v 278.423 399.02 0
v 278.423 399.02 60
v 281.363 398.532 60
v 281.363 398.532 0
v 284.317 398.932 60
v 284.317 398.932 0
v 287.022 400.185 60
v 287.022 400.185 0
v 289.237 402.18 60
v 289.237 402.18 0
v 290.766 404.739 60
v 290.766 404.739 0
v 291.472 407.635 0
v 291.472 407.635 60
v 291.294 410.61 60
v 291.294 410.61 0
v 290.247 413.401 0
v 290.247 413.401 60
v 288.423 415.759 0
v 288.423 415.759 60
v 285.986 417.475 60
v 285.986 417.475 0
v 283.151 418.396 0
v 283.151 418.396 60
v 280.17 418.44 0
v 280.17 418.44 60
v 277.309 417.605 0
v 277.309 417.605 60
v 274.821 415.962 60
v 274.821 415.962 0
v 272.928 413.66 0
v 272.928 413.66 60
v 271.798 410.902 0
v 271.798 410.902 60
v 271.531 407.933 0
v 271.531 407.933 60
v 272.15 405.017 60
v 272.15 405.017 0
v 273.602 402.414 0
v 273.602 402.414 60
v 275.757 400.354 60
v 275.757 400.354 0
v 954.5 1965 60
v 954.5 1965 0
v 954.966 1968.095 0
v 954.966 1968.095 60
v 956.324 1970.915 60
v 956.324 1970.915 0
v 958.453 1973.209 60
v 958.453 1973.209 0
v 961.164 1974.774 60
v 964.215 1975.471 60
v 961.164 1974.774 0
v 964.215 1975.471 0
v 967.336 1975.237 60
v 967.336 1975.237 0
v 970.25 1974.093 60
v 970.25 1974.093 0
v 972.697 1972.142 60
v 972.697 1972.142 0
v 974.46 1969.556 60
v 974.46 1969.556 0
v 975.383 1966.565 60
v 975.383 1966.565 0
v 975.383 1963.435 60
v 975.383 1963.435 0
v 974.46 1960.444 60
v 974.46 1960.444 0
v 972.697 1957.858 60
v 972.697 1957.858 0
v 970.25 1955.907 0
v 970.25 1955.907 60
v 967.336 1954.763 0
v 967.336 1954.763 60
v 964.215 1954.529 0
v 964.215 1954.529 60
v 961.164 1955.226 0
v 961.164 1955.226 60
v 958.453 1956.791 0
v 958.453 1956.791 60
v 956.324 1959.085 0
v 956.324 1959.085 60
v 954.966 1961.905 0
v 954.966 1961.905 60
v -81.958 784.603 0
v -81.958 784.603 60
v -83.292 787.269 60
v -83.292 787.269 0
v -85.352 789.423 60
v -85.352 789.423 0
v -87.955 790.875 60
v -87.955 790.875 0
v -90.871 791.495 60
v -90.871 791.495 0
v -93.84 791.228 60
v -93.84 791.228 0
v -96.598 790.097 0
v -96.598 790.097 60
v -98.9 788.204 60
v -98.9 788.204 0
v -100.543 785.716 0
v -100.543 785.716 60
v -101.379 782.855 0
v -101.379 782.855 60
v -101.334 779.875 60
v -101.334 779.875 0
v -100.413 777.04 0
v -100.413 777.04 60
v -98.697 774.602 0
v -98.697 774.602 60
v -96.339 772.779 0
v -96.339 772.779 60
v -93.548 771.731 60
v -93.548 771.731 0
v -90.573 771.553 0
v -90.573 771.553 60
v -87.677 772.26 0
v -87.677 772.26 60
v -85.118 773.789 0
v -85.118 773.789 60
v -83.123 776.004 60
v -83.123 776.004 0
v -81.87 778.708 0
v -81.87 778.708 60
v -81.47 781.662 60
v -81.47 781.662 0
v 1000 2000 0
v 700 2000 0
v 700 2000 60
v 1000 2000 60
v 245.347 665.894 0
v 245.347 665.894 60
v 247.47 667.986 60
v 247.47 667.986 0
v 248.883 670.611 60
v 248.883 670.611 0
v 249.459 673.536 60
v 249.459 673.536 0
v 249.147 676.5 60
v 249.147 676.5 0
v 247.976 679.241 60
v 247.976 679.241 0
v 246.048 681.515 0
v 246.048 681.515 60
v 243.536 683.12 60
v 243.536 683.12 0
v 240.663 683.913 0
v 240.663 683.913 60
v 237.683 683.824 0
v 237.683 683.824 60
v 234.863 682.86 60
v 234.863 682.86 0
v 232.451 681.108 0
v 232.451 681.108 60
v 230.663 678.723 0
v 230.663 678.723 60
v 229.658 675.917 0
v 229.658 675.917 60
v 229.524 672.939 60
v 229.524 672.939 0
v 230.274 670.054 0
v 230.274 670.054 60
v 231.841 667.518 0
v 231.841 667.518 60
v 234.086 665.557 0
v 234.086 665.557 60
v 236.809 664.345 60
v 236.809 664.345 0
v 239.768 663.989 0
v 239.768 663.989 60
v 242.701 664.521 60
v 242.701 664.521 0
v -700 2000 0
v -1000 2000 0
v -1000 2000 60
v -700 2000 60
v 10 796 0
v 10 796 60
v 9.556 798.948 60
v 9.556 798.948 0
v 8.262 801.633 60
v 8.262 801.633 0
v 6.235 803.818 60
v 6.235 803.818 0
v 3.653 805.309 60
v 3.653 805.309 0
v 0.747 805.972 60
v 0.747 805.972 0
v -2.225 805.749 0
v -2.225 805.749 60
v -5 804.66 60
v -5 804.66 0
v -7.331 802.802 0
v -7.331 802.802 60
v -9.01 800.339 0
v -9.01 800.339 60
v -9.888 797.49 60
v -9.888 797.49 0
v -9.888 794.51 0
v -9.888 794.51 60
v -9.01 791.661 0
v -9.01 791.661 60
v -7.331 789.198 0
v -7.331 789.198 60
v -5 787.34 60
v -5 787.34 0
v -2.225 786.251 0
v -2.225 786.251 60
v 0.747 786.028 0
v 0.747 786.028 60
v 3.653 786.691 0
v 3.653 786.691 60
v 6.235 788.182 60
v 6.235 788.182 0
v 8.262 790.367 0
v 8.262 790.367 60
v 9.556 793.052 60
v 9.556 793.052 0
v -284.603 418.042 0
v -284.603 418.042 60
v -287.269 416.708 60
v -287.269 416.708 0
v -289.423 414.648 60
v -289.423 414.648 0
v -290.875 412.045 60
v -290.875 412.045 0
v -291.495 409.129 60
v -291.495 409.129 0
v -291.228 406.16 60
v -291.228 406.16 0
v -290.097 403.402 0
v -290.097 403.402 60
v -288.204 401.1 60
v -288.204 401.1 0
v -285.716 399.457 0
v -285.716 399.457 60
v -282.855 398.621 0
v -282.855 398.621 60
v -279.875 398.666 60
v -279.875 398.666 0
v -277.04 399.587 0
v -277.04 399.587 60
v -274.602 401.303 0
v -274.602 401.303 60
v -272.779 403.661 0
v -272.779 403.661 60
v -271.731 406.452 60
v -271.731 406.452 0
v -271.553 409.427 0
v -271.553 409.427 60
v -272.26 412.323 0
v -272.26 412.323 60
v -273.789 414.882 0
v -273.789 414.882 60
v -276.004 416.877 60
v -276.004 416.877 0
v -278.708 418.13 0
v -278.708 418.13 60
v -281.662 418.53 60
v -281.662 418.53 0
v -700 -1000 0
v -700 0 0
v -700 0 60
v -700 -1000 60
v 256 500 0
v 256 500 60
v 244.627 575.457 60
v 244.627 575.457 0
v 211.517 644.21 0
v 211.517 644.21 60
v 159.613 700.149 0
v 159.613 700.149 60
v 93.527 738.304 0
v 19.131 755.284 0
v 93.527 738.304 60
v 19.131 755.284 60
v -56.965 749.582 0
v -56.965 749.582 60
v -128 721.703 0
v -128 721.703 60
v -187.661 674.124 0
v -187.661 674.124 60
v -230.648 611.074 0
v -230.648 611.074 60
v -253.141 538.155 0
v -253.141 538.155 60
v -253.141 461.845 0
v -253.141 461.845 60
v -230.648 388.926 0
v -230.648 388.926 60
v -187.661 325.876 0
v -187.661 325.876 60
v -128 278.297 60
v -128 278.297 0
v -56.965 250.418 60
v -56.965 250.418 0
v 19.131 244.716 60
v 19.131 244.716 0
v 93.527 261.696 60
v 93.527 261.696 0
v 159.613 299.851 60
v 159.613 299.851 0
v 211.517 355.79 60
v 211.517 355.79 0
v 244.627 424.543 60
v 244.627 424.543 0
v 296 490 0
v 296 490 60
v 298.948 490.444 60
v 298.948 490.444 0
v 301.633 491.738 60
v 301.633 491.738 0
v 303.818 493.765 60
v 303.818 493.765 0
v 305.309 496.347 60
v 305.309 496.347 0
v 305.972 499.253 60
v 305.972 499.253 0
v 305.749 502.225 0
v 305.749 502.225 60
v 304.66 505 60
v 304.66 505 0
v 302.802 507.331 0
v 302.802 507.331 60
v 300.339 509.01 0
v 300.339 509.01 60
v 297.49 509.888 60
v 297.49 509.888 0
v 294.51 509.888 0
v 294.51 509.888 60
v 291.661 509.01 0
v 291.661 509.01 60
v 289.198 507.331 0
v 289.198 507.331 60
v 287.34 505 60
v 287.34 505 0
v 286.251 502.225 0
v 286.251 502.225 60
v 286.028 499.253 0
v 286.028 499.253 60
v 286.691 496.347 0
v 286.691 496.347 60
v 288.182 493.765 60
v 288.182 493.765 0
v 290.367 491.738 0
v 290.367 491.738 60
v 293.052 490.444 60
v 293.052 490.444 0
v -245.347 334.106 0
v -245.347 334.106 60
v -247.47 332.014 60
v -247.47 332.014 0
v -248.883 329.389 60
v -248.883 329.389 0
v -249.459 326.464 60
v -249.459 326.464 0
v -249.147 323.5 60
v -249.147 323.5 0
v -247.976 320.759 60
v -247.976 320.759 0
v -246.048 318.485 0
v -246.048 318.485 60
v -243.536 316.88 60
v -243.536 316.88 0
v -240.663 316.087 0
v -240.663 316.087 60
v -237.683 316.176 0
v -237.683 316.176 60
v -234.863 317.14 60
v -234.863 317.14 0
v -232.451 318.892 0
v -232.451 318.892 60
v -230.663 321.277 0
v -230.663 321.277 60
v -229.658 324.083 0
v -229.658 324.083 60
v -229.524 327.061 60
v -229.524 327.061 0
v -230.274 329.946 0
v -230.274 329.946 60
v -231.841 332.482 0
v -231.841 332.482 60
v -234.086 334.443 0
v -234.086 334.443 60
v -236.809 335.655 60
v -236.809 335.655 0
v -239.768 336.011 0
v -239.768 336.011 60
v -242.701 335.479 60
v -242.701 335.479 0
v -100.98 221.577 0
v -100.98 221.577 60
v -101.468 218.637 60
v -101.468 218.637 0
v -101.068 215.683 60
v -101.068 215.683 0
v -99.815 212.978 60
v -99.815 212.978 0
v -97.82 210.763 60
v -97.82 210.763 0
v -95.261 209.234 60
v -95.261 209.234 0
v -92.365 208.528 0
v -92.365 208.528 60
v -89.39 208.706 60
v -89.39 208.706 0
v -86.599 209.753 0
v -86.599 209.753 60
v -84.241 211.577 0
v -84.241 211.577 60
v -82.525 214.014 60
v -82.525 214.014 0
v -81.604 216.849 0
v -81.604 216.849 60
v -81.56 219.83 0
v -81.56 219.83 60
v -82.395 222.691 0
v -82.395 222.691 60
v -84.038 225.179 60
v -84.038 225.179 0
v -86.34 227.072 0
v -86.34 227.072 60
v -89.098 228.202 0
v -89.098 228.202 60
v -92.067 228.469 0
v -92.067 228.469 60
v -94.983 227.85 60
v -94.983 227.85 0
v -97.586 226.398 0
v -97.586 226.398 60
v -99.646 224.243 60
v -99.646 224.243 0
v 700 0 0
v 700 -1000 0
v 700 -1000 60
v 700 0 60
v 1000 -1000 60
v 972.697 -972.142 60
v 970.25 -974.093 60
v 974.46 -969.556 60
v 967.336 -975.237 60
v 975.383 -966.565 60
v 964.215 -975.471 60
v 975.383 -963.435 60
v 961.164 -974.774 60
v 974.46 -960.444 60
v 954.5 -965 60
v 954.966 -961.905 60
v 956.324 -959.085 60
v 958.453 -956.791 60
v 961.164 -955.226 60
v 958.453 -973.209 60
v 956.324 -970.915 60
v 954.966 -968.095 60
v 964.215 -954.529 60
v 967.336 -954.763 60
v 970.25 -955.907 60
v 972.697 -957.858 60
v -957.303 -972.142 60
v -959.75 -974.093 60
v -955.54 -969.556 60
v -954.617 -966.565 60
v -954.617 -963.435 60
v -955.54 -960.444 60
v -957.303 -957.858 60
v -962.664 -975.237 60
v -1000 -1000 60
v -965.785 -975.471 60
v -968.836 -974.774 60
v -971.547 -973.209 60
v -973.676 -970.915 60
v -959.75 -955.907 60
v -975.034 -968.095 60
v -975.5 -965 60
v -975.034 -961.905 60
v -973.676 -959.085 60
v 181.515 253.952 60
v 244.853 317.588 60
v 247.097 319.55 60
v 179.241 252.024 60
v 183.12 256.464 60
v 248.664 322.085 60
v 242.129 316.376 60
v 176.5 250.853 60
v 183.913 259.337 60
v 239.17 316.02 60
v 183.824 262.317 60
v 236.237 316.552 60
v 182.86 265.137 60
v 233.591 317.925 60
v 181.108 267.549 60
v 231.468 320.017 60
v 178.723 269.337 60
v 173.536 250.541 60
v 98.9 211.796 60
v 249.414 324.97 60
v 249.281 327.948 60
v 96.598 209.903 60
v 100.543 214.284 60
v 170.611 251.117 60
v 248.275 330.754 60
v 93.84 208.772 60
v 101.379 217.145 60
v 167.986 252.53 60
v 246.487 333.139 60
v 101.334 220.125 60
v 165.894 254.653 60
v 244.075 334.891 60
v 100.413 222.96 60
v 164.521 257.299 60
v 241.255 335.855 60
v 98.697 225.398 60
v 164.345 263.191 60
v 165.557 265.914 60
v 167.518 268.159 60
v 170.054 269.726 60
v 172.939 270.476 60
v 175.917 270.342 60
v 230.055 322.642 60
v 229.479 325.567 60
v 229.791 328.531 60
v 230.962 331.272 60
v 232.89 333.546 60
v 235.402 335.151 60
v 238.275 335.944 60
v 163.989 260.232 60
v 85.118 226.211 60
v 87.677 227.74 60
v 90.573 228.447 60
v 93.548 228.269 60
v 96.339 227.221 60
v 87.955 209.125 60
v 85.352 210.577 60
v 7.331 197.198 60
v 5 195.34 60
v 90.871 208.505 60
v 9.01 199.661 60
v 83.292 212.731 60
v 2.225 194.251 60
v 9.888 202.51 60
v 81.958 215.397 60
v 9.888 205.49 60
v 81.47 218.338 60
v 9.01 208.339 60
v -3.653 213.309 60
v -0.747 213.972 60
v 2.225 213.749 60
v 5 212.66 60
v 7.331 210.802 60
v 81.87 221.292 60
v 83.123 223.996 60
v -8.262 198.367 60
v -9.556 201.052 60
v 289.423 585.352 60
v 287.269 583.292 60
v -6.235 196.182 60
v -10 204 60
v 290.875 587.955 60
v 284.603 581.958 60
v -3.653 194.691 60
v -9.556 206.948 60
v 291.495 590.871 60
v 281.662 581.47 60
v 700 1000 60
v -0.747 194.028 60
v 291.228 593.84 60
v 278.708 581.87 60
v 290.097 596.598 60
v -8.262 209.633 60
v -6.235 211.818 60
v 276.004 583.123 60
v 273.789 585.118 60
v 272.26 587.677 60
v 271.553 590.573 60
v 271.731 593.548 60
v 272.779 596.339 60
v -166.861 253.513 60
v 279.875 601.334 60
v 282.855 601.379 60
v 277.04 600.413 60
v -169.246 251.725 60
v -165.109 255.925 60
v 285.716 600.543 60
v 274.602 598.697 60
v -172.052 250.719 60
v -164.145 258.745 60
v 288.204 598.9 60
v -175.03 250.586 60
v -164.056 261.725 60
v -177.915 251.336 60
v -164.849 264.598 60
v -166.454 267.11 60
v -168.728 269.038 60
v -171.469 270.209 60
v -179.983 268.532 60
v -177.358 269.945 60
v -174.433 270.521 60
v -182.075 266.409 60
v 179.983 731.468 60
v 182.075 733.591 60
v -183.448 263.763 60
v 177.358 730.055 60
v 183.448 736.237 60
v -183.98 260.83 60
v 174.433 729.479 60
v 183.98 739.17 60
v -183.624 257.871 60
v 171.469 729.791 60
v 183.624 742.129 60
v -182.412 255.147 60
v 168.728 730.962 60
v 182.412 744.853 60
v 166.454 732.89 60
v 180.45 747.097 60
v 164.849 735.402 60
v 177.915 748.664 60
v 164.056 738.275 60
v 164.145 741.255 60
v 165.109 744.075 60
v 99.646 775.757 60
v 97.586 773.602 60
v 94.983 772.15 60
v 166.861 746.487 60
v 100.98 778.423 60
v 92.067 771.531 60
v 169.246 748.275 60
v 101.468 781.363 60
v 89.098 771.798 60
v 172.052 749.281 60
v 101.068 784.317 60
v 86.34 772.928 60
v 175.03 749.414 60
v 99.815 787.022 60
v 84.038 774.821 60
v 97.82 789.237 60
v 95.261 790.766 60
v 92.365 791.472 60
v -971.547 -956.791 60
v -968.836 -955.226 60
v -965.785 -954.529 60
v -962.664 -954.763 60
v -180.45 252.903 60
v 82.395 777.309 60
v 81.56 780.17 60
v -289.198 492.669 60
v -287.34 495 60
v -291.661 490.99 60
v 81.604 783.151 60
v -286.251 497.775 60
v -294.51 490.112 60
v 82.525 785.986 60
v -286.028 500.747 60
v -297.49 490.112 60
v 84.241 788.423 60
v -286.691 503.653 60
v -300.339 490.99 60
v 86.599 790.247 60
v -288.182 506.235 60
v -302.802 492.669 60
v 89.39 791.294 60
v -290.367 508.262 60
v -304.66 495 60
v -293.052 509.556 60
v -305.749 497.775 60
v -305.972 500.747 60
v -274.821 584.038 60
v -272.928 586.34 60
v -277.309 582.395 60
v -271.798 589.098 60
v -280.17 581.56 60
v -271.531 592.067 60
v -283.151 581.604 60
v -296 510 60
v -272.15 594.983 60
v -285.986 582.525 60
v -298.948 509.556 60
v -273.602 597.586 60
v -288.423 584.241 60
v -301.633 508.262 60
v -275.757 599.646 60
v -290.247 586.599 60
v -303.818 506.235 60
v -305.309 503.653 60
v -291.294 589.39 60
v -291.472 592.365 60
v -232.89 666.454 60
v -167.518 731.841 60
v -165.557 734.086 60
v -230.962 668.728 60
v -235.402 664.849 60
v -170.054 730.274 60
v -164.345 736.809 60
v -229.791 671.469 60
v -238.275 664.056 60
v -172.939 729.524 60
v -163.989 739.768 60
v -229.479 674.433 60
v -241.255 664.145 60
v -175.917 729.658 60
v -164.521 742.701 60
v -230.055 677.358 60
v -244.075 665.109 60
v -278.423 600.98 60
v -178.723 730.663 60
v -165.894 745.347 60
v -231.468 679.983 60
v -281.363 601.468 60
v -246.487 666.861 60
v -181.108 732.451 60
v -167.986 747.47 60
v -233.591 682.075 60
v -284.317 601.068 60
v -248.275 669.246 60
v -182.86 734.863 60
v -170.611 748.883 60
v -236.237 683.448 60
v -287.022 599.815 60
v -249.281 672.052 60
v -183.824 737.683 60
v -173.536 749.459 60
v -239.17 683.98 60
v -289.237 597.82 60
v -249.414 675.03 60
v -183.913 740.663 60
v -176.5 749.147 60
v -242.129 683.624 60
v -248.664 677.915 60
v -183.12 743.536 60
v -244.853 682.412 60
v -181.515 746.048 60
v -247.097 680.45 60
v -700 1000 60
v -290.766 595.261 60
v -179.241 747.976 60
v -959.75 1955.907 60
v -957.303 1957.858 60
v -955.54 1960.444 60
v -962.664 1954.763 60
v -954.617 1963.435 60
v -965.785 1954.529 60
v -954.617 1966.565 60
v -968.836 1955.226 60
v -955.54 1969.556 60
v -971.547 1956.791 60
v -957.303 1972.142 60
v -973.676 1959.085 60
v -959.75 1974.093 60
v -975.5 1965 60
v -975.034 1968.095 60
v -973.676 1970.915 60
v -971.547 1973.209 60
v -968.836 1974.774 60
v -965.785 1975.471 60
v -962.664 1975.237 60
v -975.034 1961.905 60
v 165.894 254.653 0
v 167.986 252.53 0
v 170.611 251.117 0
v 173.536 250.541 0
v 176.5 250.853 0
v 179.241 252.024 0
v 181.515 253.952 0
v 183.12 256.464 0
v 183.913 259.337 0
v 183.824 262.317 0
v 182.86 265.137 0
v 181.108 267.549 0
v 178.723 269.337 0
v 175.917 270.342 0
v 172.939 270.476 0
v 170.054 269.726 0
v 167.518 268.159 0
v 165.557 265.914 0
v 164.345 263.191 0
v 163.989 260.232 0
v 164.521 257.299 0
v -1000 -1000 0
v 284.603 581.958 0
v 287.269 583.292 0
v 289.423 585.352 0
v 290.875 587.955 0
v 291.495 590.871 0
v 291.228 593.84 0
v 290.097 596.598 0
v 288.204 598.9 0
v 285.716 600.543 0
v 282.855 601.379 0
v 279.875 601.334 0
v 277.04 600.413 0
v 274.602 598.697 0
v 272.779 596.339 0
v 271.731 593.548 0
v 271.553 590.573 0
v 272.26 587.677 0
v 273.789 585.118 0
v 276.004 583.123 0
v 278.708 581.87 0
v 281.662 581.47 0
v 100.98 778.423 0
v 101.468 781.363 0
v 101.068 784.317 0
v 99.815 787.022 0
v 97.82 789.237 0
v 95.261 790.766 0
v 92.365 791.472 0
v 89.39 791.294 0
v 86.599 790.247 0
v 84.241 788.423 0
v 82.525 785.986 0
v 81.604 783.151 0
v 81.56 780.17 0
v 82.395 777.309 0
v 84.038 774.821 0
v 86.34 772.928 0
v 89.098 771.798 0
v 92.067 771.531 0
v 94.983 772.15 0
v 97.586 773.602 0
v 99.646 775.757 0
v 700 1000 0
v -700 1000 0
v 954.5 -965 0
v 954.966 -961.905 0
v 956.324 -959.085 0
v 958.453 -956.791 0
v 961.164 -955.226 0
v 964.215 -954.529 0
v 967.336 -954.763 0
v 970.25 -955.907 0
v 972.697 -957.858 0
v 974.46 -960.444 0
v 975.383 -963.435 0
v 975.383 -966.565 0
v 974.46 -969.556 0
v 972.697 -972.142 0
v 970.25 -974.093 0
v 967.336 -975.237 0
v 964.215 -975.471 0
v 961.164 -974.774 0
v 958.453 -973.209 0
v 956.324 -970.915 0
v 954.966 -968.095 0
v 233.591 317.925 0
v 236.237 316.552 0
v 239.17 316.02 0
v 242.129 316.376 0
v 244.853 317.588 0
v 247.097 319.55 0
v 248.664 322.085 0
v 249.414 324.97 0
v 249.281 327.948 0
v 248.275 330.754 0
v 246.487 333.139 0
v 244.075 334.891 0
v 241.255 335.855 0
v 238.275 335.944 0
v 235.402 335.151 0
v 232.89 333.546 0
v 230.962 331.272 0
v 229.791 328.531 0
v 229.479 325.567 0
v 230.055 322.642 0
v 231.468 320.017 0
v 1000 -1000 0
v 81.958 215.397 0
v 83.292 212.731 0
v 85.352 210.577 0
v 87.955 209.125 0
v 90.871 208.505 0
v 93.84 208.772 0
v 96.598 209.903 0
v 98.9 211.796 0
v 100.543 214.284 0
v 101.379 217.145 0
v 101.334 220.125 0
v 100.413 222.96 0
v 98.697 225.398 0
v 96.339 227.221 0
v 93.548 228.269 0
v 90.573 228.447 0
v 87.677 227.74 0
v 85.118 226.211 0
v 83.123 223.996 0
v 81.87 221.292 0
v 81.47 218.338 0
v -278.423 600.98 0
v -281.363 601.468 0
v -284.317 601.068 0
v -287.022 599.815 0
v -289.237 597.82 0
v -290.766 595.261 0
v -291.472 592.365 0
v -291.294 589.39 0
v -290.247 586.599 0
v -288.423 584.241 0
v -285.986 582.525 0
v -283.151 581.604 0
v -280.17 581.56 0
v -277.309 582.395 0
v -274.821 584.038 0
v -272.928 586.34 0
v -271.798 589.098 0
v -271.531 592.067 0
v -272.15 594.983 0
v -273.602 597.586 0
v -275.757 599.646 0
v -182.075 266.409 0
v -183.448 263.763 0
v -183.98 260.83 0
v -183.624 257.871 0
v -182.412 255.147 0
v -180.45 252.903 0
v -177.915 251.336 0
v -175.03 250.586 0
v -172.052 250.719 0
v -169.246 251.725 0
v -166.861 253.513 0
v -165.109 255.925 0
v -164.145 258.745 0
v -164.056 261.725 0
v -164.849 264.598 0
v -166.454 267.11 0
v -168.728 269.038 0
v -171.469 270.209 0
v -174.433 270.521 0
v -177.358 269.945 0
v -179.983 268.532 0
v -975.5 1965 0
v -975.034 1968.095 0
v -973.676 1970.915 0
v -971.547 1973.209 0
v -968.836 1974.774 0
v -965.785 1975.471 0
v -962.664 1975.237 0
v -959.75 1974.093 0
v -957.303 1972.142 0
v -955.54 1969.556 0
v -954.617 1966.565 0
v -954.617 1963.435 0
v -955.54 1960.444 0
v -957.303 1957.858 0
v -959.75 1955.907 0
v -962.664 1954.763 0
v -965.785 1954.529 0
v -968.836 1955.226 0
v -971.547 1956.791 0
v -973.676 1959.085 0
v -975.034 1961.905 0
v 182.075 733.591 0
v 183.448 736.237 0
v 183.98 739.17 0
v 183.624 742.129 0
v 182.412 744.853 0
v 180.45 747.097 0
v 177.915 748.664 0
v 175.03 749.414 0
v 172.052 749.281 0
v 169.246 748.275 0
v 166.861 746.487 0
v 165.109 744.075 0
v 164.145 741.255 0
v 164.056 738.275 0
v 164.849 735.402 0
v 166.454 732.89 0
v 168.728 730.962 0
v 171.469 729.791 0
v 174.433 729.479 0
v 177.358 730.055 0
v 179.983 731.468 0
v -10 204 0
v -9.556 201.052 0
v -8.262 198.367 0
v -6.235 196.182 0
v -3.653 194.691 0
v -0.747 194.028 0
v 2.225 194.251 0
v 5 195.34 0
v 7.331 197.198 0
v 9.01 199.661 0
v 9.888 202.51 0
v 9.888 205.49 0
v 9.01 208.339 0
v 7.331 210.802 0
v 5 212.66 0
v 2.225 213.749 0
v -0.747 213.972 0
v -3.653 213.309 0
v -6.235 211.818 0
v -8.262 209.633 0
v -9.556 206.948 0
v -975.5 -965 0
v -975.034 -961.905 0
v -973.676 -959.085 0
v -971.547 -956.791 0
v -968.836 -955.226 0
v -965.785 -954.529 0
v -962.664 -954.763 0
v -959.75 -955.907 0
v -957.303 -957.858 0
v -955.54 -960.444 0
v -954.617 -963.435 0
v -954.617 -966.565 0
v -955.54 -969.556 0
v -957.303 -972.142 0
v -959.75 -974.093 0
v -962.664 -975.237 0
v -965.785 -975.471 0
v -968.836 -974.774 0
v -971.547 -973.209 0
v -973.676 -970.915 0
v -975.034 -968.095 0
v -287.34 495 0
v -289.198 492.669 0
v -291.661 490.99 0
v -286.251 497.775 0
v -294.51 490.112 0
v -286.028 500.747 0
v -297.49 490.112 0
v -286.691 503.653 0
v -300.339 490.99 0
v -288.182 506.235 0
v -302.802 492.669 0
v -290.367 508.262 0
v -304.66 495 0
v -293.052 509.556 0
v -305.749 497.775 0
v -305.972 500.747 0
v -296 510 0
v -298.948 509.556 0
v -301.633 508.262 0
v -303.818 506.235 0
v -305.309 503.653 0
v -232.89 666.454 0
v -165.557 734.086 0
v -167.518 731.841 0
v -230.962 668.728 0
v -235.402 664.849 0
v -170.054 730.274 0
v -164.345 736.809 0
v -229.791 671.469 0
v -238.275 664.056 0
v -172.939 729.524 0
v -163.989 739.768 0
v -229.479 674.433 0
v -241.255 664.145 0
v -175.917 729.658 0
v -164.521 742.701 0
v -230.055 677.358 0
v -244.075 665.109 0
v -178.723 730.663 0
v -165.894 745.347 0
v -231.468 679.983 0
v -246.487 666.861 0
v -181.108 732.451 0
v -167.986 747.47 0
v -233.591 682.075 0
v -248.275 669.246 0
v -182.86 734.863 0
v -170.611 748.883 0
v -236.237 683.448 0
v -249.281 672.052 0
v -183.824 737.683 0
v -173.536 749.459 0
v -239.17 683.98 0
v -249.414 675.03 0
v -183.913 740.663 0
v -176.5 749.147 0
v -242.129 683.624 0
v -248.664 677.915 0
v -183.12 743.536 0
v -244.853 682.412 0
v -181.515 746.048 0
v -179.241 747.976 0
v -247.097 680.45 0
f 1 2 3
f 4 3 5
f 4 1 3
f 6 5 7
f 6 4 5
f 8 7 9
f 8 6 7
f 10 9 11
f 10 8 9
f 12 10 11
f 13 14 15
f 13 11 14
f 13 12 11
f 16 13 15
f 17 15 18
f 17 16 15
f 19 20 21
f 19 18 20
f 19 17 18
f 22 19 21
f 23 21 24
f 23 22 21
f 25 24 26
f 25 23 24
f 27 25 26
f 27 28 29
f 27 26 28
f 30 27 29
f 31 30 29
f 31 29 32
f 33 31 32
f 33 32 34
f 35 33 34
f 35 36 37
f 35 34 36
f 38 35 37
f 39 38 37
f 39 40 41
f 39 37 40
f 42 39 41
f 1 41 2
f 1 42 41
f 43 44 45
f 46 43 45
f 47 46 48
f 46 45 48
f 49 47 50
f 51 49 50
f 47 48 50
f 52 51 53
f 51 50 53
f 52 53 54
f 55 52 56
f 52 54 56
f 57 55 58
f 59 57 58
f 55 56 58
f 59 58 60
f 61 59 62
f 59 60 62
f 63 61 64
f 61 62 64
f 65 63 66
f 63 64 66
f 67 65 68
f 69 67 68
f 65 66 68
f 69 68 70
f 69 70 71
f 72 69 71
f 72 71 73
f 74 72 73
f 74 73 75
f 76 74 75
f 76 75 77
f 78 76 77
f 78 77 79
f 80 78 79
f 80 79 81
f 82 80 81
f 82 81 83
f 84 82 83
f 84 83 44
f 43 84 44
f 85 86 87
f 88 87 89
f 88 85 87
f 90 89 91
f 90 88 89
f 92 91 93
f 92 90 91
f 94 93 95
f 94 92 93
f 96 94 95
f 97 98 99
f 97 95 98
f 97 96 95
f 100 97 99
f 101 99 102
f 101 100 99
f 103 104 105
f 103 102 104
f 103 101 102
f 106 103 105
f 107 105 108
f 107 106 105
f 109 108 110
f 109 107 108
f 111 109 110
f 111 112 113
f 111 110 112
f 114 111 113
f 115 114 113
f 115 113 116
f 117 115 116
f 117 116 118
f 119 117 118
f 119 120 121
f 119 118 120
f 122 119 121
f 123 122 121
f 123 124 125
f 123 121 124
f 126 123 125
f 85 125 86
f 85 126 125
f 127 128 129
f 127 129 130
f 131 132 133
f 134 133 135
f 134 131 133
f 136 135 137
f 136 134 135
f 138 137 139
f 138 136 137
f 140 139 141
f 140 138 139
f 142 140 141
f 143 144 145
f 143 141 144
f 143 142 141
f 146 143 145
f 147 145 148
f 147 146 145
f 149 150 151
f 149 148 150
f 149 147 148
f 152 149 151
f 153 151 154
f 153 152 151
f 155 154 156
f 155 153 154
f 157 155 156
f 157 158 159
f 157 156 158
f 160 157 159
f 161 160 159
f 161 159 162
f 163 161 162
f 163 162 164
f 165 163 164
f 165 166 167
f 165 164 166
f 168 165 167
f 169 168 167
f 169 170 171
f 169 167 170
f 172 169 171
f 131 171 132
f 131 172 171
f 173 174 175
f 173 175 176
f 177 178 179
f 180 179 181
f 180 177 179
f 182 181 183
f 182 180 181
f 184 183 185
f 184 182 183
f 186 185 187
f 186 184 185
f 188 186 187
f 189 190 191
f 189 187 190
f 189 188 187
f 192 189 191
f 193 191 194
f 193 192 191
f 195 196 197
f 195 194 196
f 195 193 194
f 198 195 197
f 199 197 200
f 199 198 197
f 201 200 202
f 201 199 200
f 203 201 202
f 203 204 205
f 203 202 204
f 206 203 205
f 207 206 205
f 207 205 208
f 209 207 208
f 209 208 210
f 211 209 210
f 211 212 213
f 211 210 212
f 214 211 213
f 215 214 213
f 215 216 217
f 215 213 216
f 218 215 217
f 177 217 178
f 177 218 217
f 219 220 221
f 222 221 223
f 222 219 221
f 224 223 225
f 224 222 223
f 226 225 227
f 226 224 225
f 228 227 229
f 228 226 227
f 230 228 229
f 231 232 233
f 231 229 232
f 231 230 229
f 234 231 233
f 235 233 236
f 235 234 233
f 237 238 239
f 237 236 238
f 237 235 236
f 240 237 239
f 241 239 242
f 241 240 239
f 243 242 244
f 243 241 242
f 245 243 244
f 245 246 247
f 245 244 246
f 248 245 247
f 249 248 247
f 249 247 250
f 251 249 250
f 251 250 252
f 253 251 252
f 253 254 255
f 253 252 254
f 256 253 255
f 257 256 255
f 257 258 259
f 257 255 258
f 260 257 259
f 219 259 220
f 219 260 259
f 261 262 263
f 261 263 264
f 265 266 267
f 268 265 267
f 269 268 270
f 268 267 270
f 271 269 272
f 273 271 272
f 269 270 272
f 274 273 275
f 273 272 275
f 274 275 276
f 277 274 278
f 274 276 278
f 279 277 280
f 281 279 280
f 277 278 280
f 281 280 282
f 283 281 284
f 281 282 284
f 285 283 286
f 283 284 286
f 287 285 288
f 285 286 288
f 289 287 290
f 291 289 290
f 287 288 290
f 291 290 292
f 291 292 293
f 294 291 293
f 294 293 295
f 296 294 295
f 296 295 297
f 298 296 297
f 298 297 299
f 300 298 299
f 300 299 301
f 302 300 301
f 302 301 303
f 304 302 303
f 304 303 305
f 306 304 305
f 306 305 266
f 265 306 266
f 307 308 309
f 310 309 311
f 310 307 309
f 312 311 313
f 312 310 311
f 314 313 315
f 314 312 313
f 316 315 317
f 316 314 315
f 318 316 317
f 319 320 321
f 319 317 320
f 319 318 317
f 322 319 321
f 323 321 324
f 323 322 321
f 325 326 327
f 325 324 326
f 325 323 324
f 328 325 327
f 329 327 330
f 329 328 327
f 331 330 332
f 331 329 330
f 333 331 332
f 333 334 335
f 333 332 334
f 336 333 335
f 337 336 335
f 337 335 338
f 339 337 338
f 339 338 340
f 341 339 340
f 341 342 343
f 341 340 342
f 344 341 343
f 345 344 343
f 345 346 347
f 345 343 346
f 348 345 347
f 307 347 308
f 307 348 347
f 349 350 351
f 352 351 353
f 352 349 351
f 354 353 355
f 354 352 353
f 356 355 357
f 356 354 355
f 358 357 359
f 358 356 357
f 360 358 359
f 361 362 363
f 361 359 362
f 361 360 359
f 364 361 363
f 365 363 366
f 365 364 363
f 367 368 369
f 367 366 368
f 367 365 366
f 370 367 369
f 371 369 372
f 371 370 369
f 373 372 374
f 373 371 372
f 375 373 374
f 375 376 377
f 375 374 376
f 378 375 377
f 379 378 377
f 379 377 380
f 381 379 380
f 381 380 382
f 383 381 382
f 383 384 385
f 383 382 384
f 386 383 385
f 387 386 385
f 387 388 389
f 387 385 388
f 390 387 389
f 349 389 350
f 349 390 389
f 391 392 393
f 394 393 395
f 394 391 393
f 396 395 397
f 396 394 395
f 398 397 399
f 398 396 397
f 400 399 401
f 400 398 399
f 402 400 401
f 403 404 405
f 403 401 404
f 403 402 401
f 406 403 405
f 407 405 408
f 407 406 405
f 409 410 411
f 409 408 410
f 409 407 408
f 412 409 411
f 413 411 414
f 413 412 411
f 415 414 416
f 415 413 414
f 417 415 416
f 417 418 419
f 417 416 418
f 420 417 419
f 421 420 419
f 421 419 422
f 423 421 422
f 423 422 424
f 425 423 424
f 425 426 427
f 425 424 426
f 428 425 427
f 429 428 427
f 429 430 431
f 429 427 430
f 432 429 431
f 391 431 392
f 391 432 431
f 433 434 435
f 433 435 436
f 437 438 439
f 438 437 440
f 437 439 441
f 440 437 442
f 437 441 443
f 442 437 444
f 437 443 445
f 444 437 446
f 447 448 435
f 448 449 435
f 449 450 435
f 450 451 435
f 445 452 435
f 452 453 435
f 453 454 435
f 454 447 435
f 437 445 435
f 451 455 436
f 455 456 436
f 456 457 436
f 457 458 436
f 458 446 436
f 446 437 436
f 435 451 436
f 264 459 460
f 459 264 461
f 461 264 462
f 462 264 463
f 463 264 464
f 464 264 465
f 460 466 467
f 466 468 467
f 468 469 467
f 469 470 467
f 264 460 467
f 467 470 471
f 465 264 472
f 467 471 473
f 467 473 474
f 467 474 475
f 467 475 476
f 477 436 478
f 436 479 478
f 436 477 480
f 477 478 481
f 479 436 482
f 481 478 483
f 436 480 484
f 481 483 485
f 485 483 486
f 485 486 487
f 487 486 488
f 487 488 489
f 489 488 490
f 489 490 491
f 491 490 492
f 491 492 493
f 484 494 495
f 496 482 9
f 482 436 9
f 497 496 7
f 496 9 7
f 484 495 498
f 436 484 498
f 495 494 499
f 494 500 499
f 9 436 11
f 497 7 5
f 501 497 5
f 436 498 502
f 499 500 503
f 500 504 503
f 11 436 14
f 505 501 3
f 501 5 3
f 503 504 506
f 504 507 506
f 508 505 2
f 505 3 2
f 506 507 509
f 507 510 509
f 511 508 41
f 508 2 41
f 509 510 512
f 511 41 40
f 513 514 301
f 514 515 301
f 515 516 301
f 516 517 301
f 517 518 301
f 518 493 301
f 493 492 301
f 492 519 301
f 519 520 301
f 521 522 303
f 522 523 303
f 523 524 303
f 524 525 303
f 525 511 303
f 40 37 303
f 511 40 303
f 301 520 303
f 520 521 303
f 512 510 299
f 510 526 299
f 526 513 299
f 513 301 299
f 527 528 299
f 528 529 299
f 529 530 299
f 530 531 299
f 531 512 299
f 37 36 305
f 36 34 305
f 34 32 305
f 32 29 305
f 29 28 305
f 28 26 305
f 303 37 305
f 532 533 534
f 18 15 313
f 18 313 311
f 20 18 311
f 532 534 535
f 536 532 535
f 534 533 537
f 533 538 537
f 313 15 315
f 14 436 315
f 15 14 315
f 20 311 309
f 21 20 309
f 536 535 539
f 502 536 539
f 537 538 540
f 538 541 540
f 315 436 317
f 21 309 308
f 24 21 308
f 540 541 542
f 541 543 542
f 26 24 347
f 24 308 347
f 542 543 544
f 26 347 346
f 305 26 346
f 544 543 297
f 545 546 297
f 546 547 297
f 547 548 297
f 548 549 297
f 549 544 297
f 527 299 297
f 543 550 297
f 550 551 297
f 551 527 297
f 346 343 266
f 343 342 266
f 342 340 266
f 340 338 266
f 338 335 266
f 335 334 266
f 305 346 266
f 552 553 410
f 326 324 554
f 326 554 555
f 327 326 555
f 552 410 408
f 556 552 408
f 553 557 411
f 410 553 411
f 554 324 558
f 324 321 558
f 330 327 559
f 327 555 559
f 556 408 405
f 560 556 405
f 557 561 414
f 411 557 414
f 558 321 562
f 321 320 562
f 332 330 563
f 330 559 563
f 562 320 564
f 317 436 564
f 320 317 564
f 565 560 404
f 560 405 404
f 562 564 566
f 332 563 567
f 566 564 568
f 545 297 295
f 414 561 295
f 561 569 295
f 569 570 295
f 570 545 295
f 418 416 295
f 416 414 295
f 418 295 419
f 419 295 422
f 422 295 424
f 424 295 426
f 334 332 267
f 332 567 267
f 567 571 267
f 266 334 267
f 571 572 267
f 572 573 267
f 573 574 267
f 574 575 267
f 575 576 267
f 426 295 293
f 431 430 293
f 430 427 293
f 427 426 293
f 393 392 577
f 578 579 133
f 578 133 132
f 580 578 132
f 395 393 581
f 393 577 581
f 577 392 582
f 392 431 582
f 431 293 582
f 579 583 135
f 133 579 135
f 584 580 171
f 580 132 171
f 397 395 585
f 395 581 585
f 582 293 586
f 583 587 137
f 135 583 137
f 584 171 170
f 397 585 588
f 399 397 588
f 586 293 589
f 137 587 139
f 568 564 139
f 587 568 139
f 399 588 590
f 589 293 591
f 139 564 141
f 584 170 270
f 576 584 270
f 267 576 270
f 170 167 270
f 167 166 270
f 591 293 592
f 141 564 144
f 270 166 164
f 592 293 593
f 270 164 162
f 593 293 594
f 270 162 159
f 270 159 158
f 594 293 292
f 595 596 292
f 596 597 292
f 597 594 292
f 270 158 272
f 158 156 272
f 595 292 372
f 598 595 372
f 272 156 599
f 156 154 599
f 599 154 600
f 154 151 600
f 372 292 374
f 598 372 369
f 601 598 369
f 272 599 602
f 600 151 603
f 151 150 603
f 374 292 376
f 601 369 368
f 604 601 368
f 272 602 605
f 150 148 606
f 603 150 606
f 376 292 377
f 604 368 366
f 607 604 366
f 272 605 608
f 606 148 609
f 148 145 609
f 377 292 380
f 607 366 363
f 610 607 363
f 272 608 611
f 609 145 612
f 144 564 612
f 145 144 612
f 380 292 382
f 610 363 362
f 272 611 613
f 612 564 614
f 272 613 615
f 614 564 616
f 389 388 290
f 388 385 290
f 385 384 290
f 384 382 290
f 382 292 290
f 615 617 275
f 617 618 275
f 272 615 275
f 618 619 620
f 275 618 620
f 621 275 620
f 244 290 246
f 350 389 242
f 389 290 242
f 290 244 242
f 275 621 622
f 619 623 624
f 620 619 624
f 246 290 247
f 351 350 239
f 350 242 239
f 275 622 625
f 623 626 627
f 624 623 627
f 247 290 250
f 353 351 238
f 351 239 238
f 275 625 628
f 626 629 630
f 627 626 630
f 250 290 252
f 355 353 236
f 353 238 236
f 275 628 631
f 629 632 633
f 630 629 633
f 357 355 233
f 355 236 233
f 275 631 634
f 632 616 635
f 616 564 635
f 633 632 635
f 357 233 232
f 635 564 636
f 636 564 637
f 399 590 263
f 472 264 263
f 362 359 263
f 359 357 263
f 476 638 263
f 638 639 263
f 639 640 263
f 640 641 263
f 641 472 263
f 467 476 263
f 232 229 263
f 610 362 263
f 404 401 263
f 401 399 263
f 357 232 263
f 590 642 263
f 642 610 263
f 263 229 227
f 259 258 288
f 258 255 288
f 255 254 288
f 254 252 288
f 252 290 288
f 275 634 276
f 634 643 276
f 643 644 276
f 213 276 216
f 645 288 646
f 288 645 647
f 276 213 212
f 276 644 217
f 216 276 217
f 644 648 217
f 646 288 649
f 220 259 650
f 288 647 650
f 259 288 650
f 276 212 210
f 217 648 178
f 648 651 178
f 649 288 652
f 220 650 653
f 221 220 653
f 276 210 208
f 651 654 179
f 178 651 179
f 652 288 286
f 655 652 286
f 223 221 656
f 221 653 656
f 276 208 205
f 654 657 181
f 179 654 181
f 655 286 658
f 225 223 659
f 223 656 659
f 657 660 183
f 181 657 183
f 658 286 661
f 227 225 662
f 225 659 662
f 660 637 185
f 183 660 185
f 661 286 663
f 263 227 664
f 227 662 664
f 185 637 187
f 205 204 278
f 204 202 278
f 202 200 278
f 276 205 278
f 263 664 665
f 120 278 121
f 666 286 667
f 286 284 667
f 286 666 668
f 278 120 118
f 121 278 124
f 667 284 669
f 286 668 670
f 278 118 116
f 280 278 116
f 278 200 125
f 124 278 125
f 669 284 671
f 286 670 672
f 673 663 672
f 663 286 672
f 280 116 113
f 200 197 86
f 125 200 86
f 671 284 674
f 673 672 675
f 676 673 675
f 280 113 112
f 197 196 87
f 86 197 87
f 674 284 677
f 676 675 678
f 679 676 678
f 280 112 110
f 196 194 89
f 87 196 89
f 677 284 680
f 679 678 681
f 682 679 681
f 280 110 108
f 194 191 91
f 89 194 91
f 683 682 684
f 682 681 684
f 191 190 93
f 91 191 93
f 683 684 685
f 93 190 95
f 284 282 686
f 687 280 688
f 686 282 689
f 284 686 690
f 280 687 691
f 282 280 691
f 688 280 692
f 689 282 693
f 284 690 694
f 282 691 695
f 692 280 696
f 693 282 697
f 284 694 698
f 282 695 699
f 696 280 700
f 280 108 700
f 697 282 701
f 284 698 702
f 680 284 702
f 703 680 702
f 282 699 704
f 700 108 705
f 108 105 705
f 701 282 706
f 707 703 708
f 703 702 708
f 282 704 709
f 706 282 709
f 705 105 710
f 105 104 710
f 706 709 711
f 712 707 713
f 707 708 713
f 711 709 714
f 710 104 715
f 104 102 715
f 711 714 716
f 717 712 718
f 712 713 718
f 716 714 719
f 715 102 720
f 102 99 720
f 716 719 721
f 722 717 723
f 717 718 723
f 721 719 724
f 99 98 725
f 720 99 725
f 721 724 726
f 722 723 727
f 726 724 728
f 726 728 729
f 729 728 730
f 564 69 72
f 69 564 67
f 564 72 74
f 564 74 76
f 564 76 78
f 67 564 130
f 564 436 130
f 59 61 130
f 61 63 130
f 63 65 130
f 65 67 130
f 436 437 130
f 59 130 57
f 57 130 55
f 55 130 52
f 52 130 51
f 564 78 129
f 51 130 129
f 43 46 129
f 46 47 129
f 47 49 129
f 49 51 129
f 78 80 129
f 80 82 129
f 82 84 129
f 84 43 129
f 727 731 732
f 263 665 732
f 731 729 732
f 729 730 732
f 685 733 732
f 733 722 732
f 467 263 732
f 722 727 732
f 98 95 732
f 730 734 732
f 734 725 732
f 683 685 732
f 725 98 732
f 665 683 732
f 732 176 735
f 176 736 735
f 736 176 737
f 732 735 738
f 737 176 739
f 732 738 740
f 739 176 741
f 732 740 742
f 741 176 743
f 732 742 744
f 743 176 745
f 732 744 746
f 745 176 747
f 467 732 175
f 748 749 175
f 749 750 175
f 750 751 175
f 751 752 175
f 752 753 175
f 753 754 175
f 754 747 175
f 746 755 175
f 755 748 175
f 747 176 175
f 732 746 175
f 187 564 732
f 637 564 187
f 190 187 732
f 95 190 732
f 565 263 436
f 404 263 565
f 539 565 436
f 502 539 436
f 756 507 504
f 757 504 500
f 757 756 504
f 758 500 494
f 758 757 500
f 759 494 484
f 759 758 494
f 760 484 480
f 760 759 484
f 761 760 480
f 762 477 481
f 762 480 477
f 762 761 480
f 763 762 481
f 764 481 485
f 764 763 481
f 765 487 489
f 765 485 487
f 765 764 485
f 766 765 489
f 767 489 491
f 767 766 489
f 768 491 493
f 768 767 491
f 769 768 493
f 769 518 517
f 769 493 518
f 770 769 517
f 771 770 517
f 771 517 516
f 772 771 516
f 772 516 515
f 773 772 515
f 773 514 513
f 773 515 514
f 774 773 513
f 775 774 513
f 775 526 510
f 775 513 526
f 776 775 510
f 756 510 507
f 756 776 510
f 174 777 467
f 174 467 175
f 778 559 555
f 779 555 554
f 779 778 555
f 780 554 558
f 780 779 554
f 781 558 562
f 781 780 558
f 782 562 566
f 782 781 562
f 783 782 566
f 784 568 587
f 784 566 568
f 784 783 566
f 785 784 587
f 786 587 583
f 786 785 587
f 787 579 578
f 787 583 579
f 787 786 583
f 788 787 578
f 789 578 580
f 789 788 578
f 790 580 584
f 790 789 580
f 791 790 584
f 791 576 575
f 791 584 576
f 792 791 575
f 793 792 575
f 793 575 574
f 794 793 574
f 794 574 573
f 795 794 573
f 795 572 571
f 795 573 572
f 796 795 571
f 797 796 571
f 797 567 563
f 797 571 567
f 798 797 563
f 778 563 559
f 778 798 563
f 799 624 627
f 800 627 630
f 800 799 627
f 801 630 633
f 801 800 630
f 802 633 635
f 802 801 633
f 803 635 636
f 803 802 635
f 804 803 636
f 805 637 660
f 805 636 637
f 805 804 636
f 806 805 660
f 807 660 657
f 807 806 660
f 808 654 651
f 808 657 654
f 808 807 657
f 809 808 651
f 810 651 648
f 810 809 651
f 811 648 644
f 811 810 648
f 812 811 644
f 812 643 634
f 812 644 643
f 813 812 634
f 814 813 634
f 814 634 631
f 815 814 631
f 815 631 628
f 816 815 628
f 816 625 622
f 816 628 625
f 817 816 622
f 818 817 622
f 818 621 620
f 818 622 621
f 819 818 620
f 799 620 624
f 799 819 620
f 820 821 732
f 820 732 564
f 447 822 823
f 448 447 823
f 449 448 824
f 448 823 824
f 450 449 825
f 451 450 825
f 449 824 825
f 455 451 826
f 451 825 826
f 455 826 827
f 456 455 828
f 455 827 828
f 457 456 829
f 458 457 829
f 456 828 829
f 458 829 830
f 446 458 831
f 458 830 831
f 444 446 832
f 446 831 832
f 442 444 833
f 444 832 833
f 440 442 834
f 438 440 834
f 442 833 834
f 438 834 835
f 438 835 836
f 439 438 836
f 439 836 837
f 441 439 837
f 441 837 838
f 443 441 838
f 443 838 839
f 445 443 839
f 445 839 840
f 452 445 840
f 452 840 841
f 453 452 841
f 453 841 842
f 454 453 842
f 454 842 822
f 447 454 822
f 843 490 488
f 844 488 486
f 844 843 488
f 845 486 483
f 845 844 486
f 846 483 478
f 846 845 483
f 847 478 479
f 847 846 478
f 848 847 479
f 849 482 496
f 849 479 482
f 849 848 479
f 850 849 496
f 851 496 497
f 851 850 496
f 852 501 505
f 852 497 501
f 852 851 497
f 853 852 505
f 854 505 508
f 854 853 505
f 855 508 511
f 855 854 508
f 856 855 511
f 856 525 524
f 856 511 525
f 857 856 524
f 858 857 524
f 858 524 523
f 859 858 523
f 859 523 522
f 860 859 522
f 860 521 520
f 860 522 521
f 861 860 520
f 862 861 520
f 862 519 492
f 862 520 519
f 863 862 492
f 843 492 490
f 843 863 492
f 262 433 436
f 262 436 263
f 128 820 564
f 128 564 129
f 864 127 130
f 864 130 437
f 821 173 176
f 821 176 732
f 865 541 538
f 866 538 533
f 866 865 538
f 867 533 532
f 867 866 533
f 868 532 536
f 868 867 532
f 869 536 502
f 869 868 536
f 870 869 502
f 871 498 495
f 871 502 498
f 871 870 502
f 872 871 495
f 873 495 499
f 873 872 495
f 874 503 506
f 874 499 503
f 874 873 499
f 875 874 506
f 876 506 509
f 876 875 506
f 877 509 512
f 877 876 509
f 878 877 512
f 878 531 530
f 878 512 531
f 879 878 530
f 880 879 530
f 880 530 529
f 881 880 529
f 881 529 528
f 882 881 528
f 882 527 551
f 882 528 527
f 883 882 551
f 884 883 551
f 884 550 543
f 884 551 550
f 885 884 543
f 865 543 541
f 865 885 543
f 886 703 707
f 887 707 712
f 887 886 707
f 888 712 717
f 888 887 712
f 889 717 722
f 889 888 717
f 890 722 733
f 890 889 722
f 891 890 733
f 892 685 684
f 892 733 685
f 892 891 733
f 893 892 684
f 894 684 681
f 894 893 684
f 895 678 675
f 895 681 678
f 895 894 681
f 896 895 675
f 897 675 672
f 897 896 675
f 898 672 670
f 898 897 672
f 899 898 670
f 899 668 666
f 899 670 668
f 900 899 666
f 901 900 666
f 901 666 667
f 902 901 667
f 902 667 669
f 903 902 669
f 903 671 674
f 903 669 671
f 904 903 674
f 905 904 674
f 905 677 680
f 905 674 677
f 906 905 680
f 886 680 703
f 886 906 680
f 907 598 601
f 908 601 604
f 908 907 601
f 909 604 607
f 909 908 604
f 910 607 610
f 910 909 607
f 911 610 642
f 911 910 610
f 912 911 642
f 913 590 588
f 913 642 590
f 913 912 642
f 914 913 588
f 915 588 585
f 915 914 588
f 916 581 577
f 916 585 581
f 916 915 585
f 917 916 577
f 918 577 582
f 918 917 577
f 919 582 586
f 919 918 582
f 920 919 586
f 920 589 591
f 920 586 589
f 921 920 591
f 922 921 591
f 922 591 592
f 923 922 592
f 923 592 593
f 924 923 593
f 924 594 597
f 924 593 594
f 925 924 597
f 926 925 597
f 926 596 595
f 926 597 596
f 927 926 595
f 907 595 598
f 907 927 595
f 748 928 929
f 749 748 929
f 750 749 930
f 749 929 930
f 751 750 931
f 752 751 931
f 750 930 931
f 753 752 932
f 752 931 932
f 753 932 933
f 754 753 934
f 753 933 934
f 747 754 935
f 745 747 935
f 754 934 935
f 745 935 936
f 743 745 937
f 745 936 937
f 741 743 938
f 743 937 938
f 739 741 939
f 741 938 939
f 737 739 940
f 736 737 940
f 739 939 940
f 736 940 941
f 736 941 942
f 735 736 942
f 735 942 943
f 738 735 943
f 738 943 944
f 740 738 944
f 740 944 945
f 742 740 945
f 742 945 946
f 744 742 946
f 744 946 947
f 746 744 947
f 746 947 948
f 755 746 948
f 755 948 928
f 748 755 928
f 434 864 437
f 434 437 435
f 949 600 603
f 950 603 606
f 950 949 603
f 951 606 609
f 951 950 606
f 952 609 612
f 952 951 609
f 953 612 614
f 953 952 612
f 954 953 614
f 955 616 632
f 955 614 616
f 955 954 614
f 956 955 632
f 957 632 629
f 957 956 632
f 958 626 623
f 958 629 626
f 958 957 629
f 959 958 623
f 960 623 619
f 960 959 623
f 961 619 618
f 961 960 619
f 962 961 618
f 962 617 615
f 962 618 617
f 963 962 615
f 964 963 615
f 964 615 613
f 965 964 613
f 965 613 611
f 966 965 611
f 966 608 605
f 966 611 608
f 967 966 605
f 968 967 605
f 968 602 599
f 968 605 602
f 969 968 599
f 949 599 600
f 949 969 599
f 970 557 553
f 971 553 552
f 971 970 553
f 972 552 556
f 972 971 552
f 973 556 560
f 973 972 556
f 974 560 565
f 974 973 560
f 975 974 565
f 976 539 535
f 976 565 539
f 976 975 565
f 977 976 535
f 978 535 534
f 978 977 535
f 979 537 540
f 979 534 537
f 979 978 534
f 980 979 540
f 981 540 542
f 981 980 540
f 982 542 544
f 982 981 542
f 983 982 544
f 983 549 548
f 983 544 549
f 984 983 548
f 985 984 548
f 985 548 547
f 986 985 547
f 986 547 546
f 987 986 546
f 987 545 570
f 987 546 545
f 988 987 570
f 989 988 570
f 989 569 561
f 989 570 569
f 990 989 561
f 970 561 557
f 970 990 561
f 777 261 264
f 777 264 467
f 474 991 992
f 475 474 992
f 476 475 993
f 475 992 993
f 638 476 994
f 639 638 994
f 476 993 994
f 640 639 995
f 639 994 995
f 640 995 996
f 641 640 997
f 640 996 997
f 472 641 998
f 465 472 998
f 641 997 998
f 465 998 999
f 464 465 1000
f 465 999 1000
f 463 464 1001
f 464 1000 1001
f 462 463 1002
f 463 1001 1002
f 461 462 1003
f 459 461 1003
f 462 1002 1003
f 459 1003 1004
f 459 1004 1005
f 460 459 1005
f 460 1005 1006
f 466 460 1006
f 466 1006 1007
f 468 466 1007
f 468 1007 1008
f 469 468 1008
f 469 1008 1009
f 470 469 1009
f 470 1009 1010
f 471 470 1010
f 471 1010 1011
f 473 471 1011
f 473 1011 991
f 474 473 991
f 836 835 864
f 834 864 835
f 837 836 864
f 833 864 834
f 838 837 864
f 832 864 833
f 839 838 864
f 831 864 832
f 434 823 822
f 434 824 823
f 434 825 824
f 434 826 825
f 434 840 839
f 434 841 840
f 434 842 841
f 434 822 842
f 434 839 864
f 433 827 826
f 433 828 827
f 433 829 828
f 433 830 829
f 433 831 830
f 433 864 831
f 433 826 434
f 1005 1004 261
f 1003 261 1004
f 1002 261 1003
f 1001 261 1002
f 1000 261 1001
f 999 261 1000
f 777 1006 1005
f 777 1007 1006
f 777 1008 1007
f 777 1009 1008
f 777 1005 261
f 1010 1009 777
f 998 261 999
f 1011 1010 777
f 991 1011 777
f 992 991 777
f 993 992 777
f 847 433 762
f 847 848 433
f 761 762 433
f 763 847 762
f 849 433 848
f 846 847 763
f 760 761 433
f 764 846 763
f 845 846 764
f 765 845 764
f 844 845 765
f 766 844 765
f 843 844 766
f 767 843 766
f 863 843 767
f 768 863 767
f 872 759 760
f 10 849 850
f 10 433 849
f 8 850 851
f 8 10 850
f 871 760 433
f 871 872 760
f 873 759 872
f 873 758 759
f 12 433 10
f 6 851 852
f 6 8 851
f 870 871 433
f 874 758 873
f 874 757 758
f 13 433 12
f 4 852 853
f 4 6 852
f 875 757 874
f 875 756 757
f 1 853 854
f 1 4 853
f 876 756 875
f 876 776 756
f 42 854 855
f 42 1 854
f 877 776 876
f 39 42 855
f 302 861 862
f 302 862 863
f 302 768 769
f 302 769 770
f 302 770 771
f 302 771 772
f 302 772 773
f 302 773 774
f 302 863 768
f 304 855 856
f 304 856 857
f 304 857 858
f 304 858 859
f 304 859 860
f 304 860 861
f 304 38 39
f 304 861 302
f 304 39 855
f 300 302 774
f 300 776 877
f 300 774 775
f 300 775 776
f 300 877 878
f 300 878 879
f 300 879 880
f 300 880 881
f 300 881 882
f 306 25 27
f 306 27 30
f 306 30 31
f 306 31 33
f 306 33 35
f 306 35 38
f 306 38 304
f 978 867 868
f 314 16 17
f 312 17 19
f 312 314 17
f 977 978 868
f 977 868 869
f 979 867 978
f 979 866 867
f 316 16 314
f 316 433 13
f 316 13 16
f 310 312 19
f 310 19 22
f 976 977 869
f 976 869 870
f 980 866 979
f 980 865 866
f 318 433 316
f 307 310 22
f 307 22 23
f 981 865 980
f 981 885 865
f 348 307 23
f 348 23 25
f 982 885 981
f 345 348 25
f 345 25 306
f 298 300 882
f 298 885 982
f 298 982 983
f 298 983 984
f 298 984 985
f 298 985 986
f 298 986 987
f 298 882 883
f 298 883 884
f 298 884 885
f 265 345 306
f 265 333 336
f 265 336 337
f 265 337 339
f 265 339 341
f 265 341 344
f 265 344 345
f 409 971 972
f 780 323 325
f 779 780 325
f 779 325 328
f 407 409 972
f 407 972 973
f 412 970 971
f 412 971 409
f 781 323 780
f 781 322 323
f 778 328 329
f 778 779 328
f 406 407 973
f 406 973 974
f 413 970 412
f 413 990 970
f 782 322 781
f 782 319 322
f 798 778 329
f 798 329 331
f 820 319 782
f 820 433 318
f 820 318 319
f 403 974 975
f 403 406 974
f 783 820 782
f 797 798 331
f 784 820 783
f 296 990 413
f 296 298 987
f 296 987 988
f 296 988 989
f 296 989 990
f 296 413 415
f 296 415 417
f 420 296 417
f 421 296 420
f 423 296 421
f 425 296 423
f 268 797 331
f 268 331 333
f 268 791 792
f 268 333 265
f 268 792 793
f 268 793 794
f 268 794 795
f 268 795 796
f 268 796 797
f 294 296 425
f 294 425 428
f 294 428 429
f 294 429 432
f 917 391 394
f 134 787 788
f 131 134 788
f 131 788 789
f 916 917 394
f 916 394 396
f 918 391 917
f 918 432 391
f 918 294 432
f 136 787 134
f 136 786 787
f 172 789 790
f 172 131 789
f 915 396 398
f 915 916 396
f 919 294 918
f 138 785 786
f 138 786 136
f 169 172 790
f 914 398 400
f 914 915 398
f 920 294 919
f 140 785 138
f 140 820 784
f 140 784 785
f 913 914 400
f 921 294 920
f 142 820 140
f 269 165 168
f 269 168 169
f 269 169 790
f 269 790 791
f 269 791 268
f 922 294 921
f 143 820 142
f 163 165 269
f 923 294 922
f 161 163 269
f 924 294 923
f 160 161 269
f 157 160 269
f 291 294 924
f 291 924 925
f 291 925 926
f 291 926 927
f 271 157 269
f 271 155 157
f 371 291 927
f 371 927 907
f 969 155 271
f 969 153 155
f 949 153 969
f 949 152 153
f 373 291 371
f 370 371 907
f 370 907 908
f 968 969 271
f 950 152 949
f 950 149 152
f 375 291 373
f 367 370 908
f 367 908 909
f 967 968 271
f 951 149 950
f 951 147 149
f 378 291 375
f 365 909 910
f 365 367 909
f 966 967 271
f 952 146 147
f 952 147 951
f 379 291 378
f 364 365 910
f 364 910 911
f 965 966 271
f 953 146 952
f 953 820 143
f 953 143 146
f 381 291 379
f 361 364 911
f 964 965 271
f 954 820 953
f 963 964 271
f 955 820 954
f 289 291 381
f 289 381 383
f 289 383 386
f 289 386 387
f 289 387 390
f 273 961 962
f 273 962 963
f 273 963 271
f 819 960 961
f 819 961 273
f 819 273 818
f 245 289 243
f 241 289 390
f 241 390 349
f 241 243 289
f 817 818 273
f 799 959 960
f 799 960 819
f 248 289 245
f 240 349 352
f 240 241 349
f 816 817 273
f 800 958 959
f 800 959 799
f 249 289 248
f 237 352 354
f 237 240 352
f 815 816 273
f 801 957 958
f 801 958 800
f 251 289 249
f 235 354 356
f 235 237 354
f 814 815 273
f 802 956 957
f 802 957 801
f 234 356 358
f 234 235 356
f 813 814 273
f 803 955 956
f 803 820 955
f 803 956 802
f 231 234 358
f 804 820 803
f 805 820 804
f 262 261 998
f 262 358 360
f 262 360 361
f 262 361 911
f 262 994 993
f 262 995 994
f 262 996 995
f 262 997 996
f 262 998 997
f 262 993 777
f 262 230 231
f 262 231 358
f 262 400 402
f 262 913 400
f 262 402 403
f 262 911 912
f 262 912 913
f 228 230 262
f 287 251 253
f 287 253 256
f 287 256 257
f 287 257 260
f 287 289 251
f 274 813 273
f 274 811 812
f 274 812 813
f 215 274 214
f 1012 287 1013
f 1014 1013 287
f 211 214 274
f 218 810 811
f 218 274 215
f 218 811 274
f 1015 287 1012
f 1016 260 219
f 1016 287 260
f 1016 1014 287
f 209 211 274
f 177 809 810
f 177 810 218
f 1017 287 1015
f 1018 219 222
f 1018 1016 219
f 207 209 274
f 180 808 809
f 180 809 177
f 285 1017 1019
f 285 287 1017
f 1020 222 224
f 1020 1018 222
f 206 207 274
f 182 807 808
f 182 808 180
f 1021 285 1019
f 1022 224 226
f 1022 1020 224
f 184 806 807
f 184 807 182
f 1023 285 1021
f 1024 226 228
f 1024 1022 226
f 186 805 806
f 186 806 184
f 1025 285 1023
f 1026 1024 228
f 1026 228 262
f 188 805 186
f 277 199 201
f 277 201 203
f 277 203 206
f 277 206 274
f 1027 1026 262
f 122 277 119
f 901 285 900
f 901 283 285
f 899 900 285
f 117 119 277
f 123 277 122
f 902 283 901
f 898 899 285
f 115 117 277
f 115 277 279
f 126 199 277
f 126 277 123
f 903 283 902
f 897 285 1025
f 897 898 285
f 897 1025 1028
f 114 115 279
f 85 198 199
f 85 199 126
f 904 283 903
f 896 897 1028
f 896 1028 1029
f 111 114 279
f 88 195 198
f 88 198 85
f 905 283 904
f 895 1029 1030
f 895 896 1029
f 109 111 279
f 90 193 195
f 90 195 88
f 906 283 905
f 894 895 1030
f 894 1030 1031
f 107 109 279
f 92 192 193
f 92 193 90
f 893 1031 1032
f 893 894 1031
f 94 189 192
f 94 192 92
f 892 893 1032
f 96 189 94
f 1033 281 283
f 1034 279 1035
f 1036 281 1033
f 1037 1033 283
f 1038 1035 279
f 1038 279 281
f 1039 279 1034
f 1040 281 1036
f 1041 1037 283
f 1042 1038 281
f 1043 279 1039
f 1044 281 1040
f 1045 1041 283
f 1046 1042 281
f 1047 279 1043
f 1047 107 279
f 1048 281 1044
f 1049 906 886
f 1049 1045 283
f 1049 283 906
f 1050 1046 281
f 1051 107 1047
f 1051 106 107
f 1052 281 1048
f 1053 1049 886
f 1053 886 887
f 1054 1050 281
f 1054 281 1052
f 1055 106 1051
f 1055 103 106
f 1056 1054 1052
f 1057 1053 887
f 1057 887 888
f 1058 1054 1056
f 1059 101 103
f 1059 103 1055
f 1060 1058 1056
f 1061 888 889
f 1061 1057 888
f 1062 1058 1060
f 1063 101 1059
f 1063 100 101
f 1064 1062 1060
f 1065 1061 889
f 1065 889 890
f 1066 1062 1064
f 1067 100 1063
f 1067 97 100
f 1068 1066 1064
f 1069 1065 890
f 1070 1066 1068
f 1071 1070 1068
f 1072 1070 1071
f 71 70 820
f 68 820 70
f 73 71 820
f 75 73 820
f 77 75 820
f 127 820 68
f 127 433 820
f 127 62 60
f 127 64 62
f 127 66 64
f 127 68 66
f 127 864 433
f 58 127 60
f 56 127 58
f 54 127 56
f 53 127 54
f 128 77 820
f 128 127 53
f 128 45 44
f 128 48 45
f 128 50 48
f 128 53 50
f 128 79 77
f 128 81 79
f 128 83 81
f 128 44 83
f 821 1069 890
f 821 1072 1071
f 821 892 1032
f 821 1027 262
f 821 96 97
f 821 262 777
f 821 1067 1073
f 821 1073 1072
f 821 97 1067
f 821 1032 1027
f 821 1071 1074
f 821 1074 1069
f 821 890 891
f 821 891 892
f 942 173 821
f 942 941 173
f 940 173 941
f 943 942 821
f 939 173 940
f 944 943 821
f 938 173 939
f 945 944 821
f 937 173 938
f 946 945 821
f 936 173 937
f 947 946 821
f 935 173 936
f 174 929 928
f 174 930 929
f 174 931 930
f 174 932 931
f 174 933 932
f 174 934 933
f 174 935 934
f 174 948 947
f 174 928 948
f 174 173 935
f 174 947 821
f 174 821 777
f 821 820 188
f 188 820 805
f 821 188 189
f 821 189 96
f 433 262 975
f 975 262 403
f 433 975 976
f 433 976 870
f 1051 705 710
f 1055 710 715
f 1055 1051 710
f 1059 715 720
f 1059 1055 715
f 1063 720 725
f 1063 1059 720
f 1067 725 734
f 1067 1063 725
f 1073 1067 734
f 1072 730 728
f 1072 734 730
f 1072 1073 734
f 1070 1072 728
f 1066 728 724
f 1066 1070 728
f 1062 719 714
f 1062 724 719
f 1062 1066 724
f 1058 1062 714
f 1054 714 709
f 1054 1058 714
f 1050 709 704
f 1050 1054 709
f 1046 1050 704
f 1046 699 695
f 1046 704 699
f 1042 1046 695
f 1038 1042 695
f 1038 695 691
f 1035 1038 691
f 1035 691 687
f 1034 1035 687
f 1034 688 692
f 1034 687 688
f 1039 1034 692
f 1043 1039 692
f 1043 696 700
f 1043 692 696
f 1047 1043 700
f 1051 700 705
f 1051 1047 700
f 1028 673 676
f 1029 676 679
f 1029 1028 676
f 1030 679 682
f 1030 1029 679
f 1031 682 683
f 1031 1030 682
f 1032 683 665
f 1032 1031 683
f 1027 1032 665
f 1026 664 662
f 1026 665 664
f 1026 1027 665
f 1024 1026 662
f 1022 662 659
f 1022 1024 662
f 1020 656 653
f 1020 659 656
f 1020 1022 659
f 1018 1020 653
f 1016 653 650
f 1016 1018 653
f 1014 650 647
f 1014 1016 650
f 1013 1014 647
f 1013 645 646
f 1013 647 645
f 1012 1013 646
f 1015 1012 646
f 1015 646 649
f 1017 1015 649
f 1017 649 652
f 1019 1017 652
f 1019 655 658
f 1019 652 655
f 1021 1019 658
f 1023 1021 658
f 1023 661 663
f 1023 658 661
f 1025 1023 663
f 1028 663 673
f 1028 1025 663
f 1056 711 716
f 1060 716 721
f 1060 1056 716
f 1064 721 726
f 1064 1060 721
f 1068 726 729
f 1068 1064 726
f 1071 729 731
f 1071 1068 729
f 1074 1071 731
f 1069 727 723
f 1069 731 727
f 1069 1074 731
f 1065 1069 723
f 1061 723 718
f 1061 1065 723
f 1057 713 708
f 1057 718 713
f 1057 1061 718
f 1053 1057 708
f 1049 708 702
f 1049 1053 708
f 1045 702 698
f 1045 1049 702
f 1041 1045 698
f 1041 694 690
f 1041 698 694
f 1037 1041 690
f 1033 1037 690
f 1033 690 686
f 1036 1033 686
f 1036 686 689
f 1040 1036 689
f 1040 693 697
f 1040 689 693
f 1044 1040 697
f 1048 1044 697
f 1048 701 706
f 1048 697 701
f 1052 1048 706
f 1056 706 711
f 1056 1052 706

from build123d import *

# Parameters (mm, degrees)
BOSS_EXTRU_1_DEPTH           = 60
ESQUISSE2_R                  = 256
ENL_V_MAT_EXTRU_1_DEPTH      = 2237.872817127
ESQUISSE5_R                  = 10
ENL_V_MAT_EXTRU_3_DEPTH      = 2237.872817127
R_P_TITION_CIRCULAIRE1_COUNT = 20
ESQUISSE6_R                  = 10.5
ENL_V_MAT_EXTRU_4_DEPTH      = 2237.872817127


with BuildPart() as part:
    # Esquisse1 → Boss.-Extru.1 (new body)
    with BuildSketch(Plane.XY):
        Polygon((-1000, 2000), (-700, 2000), (-700, 1000), (700, 1000), (700, 2000), (1000, 2000), (1000, -1000), (700, -1000), (700, 0), (-700, 0), (-700, -1000), (-1000, -1000), align=None)
    extrude(amount=BOSS_EXTRU_1_DEPTH)

    # Esquisse2 → Enlèv. mat.-Extru.1 (cut, through all)
    with BuildSketch(Plane.XY.offset(60)):
        with Locations((0, 500)):
            Circle(ESQUISSE2_R)
    extrude(amount=-ENL_V_MAT_EXTRU_1_DEPTH, mode=Mode.SUBTRACT)

    # Esquisse5 → Enlèv. mat.-Extru.3 (cut, through all)
    with BuildSketch(Plane.XY):
        with Locations((0, 796)):
            Circle(ESQUISSE5_R)
    enl_v_mat_extru_3 = extrude(amount=ENL_V_MAT_EXTRU_3_DEPTH, mode=Mode.SUBTRACT)

    # Répétition circulaire1: Enlèv. mat.-Extru.3 ×20 about axis
    r_p_tition_circulaire1_axis = Axis((0, 500, 0), (0, 0, 1))
    for i in range(1, R_P_TITION_CIRCULAIRE1_COUNT):
        add(enl_v_mat_extru_3.rotate(r_p_tition_circulaire1_axis, i * 360 / R_P_TITION_CIRCULAIRE1_COUNT), mode=Mode.SUBTRACT)

    # Esquisse6 → Enlèv. mat.-Extru.4 (cut, through all)
    with BuildSketch(Plane(origin=(0, 0, 0), x_dir=(-1, 0, 0), z_dir=(0, 0, -1))):
        with Locations((-965, 1965)):
            Circle(ESQUISSE6_R)
        with Locations((-965, -965)):
            Circle(ESQUISSE6_R)
        with Locations((965, -965)):
            Circle(ESQUISSE6_R)
        with Locations((965, 1965)):
            Circle(ESQUISSE6_R)
    extrude(amount=-ENL_V_MAT_EXTRU_4_DEPTH, mode=Mode.SUBTRACT)


solid = part.part
